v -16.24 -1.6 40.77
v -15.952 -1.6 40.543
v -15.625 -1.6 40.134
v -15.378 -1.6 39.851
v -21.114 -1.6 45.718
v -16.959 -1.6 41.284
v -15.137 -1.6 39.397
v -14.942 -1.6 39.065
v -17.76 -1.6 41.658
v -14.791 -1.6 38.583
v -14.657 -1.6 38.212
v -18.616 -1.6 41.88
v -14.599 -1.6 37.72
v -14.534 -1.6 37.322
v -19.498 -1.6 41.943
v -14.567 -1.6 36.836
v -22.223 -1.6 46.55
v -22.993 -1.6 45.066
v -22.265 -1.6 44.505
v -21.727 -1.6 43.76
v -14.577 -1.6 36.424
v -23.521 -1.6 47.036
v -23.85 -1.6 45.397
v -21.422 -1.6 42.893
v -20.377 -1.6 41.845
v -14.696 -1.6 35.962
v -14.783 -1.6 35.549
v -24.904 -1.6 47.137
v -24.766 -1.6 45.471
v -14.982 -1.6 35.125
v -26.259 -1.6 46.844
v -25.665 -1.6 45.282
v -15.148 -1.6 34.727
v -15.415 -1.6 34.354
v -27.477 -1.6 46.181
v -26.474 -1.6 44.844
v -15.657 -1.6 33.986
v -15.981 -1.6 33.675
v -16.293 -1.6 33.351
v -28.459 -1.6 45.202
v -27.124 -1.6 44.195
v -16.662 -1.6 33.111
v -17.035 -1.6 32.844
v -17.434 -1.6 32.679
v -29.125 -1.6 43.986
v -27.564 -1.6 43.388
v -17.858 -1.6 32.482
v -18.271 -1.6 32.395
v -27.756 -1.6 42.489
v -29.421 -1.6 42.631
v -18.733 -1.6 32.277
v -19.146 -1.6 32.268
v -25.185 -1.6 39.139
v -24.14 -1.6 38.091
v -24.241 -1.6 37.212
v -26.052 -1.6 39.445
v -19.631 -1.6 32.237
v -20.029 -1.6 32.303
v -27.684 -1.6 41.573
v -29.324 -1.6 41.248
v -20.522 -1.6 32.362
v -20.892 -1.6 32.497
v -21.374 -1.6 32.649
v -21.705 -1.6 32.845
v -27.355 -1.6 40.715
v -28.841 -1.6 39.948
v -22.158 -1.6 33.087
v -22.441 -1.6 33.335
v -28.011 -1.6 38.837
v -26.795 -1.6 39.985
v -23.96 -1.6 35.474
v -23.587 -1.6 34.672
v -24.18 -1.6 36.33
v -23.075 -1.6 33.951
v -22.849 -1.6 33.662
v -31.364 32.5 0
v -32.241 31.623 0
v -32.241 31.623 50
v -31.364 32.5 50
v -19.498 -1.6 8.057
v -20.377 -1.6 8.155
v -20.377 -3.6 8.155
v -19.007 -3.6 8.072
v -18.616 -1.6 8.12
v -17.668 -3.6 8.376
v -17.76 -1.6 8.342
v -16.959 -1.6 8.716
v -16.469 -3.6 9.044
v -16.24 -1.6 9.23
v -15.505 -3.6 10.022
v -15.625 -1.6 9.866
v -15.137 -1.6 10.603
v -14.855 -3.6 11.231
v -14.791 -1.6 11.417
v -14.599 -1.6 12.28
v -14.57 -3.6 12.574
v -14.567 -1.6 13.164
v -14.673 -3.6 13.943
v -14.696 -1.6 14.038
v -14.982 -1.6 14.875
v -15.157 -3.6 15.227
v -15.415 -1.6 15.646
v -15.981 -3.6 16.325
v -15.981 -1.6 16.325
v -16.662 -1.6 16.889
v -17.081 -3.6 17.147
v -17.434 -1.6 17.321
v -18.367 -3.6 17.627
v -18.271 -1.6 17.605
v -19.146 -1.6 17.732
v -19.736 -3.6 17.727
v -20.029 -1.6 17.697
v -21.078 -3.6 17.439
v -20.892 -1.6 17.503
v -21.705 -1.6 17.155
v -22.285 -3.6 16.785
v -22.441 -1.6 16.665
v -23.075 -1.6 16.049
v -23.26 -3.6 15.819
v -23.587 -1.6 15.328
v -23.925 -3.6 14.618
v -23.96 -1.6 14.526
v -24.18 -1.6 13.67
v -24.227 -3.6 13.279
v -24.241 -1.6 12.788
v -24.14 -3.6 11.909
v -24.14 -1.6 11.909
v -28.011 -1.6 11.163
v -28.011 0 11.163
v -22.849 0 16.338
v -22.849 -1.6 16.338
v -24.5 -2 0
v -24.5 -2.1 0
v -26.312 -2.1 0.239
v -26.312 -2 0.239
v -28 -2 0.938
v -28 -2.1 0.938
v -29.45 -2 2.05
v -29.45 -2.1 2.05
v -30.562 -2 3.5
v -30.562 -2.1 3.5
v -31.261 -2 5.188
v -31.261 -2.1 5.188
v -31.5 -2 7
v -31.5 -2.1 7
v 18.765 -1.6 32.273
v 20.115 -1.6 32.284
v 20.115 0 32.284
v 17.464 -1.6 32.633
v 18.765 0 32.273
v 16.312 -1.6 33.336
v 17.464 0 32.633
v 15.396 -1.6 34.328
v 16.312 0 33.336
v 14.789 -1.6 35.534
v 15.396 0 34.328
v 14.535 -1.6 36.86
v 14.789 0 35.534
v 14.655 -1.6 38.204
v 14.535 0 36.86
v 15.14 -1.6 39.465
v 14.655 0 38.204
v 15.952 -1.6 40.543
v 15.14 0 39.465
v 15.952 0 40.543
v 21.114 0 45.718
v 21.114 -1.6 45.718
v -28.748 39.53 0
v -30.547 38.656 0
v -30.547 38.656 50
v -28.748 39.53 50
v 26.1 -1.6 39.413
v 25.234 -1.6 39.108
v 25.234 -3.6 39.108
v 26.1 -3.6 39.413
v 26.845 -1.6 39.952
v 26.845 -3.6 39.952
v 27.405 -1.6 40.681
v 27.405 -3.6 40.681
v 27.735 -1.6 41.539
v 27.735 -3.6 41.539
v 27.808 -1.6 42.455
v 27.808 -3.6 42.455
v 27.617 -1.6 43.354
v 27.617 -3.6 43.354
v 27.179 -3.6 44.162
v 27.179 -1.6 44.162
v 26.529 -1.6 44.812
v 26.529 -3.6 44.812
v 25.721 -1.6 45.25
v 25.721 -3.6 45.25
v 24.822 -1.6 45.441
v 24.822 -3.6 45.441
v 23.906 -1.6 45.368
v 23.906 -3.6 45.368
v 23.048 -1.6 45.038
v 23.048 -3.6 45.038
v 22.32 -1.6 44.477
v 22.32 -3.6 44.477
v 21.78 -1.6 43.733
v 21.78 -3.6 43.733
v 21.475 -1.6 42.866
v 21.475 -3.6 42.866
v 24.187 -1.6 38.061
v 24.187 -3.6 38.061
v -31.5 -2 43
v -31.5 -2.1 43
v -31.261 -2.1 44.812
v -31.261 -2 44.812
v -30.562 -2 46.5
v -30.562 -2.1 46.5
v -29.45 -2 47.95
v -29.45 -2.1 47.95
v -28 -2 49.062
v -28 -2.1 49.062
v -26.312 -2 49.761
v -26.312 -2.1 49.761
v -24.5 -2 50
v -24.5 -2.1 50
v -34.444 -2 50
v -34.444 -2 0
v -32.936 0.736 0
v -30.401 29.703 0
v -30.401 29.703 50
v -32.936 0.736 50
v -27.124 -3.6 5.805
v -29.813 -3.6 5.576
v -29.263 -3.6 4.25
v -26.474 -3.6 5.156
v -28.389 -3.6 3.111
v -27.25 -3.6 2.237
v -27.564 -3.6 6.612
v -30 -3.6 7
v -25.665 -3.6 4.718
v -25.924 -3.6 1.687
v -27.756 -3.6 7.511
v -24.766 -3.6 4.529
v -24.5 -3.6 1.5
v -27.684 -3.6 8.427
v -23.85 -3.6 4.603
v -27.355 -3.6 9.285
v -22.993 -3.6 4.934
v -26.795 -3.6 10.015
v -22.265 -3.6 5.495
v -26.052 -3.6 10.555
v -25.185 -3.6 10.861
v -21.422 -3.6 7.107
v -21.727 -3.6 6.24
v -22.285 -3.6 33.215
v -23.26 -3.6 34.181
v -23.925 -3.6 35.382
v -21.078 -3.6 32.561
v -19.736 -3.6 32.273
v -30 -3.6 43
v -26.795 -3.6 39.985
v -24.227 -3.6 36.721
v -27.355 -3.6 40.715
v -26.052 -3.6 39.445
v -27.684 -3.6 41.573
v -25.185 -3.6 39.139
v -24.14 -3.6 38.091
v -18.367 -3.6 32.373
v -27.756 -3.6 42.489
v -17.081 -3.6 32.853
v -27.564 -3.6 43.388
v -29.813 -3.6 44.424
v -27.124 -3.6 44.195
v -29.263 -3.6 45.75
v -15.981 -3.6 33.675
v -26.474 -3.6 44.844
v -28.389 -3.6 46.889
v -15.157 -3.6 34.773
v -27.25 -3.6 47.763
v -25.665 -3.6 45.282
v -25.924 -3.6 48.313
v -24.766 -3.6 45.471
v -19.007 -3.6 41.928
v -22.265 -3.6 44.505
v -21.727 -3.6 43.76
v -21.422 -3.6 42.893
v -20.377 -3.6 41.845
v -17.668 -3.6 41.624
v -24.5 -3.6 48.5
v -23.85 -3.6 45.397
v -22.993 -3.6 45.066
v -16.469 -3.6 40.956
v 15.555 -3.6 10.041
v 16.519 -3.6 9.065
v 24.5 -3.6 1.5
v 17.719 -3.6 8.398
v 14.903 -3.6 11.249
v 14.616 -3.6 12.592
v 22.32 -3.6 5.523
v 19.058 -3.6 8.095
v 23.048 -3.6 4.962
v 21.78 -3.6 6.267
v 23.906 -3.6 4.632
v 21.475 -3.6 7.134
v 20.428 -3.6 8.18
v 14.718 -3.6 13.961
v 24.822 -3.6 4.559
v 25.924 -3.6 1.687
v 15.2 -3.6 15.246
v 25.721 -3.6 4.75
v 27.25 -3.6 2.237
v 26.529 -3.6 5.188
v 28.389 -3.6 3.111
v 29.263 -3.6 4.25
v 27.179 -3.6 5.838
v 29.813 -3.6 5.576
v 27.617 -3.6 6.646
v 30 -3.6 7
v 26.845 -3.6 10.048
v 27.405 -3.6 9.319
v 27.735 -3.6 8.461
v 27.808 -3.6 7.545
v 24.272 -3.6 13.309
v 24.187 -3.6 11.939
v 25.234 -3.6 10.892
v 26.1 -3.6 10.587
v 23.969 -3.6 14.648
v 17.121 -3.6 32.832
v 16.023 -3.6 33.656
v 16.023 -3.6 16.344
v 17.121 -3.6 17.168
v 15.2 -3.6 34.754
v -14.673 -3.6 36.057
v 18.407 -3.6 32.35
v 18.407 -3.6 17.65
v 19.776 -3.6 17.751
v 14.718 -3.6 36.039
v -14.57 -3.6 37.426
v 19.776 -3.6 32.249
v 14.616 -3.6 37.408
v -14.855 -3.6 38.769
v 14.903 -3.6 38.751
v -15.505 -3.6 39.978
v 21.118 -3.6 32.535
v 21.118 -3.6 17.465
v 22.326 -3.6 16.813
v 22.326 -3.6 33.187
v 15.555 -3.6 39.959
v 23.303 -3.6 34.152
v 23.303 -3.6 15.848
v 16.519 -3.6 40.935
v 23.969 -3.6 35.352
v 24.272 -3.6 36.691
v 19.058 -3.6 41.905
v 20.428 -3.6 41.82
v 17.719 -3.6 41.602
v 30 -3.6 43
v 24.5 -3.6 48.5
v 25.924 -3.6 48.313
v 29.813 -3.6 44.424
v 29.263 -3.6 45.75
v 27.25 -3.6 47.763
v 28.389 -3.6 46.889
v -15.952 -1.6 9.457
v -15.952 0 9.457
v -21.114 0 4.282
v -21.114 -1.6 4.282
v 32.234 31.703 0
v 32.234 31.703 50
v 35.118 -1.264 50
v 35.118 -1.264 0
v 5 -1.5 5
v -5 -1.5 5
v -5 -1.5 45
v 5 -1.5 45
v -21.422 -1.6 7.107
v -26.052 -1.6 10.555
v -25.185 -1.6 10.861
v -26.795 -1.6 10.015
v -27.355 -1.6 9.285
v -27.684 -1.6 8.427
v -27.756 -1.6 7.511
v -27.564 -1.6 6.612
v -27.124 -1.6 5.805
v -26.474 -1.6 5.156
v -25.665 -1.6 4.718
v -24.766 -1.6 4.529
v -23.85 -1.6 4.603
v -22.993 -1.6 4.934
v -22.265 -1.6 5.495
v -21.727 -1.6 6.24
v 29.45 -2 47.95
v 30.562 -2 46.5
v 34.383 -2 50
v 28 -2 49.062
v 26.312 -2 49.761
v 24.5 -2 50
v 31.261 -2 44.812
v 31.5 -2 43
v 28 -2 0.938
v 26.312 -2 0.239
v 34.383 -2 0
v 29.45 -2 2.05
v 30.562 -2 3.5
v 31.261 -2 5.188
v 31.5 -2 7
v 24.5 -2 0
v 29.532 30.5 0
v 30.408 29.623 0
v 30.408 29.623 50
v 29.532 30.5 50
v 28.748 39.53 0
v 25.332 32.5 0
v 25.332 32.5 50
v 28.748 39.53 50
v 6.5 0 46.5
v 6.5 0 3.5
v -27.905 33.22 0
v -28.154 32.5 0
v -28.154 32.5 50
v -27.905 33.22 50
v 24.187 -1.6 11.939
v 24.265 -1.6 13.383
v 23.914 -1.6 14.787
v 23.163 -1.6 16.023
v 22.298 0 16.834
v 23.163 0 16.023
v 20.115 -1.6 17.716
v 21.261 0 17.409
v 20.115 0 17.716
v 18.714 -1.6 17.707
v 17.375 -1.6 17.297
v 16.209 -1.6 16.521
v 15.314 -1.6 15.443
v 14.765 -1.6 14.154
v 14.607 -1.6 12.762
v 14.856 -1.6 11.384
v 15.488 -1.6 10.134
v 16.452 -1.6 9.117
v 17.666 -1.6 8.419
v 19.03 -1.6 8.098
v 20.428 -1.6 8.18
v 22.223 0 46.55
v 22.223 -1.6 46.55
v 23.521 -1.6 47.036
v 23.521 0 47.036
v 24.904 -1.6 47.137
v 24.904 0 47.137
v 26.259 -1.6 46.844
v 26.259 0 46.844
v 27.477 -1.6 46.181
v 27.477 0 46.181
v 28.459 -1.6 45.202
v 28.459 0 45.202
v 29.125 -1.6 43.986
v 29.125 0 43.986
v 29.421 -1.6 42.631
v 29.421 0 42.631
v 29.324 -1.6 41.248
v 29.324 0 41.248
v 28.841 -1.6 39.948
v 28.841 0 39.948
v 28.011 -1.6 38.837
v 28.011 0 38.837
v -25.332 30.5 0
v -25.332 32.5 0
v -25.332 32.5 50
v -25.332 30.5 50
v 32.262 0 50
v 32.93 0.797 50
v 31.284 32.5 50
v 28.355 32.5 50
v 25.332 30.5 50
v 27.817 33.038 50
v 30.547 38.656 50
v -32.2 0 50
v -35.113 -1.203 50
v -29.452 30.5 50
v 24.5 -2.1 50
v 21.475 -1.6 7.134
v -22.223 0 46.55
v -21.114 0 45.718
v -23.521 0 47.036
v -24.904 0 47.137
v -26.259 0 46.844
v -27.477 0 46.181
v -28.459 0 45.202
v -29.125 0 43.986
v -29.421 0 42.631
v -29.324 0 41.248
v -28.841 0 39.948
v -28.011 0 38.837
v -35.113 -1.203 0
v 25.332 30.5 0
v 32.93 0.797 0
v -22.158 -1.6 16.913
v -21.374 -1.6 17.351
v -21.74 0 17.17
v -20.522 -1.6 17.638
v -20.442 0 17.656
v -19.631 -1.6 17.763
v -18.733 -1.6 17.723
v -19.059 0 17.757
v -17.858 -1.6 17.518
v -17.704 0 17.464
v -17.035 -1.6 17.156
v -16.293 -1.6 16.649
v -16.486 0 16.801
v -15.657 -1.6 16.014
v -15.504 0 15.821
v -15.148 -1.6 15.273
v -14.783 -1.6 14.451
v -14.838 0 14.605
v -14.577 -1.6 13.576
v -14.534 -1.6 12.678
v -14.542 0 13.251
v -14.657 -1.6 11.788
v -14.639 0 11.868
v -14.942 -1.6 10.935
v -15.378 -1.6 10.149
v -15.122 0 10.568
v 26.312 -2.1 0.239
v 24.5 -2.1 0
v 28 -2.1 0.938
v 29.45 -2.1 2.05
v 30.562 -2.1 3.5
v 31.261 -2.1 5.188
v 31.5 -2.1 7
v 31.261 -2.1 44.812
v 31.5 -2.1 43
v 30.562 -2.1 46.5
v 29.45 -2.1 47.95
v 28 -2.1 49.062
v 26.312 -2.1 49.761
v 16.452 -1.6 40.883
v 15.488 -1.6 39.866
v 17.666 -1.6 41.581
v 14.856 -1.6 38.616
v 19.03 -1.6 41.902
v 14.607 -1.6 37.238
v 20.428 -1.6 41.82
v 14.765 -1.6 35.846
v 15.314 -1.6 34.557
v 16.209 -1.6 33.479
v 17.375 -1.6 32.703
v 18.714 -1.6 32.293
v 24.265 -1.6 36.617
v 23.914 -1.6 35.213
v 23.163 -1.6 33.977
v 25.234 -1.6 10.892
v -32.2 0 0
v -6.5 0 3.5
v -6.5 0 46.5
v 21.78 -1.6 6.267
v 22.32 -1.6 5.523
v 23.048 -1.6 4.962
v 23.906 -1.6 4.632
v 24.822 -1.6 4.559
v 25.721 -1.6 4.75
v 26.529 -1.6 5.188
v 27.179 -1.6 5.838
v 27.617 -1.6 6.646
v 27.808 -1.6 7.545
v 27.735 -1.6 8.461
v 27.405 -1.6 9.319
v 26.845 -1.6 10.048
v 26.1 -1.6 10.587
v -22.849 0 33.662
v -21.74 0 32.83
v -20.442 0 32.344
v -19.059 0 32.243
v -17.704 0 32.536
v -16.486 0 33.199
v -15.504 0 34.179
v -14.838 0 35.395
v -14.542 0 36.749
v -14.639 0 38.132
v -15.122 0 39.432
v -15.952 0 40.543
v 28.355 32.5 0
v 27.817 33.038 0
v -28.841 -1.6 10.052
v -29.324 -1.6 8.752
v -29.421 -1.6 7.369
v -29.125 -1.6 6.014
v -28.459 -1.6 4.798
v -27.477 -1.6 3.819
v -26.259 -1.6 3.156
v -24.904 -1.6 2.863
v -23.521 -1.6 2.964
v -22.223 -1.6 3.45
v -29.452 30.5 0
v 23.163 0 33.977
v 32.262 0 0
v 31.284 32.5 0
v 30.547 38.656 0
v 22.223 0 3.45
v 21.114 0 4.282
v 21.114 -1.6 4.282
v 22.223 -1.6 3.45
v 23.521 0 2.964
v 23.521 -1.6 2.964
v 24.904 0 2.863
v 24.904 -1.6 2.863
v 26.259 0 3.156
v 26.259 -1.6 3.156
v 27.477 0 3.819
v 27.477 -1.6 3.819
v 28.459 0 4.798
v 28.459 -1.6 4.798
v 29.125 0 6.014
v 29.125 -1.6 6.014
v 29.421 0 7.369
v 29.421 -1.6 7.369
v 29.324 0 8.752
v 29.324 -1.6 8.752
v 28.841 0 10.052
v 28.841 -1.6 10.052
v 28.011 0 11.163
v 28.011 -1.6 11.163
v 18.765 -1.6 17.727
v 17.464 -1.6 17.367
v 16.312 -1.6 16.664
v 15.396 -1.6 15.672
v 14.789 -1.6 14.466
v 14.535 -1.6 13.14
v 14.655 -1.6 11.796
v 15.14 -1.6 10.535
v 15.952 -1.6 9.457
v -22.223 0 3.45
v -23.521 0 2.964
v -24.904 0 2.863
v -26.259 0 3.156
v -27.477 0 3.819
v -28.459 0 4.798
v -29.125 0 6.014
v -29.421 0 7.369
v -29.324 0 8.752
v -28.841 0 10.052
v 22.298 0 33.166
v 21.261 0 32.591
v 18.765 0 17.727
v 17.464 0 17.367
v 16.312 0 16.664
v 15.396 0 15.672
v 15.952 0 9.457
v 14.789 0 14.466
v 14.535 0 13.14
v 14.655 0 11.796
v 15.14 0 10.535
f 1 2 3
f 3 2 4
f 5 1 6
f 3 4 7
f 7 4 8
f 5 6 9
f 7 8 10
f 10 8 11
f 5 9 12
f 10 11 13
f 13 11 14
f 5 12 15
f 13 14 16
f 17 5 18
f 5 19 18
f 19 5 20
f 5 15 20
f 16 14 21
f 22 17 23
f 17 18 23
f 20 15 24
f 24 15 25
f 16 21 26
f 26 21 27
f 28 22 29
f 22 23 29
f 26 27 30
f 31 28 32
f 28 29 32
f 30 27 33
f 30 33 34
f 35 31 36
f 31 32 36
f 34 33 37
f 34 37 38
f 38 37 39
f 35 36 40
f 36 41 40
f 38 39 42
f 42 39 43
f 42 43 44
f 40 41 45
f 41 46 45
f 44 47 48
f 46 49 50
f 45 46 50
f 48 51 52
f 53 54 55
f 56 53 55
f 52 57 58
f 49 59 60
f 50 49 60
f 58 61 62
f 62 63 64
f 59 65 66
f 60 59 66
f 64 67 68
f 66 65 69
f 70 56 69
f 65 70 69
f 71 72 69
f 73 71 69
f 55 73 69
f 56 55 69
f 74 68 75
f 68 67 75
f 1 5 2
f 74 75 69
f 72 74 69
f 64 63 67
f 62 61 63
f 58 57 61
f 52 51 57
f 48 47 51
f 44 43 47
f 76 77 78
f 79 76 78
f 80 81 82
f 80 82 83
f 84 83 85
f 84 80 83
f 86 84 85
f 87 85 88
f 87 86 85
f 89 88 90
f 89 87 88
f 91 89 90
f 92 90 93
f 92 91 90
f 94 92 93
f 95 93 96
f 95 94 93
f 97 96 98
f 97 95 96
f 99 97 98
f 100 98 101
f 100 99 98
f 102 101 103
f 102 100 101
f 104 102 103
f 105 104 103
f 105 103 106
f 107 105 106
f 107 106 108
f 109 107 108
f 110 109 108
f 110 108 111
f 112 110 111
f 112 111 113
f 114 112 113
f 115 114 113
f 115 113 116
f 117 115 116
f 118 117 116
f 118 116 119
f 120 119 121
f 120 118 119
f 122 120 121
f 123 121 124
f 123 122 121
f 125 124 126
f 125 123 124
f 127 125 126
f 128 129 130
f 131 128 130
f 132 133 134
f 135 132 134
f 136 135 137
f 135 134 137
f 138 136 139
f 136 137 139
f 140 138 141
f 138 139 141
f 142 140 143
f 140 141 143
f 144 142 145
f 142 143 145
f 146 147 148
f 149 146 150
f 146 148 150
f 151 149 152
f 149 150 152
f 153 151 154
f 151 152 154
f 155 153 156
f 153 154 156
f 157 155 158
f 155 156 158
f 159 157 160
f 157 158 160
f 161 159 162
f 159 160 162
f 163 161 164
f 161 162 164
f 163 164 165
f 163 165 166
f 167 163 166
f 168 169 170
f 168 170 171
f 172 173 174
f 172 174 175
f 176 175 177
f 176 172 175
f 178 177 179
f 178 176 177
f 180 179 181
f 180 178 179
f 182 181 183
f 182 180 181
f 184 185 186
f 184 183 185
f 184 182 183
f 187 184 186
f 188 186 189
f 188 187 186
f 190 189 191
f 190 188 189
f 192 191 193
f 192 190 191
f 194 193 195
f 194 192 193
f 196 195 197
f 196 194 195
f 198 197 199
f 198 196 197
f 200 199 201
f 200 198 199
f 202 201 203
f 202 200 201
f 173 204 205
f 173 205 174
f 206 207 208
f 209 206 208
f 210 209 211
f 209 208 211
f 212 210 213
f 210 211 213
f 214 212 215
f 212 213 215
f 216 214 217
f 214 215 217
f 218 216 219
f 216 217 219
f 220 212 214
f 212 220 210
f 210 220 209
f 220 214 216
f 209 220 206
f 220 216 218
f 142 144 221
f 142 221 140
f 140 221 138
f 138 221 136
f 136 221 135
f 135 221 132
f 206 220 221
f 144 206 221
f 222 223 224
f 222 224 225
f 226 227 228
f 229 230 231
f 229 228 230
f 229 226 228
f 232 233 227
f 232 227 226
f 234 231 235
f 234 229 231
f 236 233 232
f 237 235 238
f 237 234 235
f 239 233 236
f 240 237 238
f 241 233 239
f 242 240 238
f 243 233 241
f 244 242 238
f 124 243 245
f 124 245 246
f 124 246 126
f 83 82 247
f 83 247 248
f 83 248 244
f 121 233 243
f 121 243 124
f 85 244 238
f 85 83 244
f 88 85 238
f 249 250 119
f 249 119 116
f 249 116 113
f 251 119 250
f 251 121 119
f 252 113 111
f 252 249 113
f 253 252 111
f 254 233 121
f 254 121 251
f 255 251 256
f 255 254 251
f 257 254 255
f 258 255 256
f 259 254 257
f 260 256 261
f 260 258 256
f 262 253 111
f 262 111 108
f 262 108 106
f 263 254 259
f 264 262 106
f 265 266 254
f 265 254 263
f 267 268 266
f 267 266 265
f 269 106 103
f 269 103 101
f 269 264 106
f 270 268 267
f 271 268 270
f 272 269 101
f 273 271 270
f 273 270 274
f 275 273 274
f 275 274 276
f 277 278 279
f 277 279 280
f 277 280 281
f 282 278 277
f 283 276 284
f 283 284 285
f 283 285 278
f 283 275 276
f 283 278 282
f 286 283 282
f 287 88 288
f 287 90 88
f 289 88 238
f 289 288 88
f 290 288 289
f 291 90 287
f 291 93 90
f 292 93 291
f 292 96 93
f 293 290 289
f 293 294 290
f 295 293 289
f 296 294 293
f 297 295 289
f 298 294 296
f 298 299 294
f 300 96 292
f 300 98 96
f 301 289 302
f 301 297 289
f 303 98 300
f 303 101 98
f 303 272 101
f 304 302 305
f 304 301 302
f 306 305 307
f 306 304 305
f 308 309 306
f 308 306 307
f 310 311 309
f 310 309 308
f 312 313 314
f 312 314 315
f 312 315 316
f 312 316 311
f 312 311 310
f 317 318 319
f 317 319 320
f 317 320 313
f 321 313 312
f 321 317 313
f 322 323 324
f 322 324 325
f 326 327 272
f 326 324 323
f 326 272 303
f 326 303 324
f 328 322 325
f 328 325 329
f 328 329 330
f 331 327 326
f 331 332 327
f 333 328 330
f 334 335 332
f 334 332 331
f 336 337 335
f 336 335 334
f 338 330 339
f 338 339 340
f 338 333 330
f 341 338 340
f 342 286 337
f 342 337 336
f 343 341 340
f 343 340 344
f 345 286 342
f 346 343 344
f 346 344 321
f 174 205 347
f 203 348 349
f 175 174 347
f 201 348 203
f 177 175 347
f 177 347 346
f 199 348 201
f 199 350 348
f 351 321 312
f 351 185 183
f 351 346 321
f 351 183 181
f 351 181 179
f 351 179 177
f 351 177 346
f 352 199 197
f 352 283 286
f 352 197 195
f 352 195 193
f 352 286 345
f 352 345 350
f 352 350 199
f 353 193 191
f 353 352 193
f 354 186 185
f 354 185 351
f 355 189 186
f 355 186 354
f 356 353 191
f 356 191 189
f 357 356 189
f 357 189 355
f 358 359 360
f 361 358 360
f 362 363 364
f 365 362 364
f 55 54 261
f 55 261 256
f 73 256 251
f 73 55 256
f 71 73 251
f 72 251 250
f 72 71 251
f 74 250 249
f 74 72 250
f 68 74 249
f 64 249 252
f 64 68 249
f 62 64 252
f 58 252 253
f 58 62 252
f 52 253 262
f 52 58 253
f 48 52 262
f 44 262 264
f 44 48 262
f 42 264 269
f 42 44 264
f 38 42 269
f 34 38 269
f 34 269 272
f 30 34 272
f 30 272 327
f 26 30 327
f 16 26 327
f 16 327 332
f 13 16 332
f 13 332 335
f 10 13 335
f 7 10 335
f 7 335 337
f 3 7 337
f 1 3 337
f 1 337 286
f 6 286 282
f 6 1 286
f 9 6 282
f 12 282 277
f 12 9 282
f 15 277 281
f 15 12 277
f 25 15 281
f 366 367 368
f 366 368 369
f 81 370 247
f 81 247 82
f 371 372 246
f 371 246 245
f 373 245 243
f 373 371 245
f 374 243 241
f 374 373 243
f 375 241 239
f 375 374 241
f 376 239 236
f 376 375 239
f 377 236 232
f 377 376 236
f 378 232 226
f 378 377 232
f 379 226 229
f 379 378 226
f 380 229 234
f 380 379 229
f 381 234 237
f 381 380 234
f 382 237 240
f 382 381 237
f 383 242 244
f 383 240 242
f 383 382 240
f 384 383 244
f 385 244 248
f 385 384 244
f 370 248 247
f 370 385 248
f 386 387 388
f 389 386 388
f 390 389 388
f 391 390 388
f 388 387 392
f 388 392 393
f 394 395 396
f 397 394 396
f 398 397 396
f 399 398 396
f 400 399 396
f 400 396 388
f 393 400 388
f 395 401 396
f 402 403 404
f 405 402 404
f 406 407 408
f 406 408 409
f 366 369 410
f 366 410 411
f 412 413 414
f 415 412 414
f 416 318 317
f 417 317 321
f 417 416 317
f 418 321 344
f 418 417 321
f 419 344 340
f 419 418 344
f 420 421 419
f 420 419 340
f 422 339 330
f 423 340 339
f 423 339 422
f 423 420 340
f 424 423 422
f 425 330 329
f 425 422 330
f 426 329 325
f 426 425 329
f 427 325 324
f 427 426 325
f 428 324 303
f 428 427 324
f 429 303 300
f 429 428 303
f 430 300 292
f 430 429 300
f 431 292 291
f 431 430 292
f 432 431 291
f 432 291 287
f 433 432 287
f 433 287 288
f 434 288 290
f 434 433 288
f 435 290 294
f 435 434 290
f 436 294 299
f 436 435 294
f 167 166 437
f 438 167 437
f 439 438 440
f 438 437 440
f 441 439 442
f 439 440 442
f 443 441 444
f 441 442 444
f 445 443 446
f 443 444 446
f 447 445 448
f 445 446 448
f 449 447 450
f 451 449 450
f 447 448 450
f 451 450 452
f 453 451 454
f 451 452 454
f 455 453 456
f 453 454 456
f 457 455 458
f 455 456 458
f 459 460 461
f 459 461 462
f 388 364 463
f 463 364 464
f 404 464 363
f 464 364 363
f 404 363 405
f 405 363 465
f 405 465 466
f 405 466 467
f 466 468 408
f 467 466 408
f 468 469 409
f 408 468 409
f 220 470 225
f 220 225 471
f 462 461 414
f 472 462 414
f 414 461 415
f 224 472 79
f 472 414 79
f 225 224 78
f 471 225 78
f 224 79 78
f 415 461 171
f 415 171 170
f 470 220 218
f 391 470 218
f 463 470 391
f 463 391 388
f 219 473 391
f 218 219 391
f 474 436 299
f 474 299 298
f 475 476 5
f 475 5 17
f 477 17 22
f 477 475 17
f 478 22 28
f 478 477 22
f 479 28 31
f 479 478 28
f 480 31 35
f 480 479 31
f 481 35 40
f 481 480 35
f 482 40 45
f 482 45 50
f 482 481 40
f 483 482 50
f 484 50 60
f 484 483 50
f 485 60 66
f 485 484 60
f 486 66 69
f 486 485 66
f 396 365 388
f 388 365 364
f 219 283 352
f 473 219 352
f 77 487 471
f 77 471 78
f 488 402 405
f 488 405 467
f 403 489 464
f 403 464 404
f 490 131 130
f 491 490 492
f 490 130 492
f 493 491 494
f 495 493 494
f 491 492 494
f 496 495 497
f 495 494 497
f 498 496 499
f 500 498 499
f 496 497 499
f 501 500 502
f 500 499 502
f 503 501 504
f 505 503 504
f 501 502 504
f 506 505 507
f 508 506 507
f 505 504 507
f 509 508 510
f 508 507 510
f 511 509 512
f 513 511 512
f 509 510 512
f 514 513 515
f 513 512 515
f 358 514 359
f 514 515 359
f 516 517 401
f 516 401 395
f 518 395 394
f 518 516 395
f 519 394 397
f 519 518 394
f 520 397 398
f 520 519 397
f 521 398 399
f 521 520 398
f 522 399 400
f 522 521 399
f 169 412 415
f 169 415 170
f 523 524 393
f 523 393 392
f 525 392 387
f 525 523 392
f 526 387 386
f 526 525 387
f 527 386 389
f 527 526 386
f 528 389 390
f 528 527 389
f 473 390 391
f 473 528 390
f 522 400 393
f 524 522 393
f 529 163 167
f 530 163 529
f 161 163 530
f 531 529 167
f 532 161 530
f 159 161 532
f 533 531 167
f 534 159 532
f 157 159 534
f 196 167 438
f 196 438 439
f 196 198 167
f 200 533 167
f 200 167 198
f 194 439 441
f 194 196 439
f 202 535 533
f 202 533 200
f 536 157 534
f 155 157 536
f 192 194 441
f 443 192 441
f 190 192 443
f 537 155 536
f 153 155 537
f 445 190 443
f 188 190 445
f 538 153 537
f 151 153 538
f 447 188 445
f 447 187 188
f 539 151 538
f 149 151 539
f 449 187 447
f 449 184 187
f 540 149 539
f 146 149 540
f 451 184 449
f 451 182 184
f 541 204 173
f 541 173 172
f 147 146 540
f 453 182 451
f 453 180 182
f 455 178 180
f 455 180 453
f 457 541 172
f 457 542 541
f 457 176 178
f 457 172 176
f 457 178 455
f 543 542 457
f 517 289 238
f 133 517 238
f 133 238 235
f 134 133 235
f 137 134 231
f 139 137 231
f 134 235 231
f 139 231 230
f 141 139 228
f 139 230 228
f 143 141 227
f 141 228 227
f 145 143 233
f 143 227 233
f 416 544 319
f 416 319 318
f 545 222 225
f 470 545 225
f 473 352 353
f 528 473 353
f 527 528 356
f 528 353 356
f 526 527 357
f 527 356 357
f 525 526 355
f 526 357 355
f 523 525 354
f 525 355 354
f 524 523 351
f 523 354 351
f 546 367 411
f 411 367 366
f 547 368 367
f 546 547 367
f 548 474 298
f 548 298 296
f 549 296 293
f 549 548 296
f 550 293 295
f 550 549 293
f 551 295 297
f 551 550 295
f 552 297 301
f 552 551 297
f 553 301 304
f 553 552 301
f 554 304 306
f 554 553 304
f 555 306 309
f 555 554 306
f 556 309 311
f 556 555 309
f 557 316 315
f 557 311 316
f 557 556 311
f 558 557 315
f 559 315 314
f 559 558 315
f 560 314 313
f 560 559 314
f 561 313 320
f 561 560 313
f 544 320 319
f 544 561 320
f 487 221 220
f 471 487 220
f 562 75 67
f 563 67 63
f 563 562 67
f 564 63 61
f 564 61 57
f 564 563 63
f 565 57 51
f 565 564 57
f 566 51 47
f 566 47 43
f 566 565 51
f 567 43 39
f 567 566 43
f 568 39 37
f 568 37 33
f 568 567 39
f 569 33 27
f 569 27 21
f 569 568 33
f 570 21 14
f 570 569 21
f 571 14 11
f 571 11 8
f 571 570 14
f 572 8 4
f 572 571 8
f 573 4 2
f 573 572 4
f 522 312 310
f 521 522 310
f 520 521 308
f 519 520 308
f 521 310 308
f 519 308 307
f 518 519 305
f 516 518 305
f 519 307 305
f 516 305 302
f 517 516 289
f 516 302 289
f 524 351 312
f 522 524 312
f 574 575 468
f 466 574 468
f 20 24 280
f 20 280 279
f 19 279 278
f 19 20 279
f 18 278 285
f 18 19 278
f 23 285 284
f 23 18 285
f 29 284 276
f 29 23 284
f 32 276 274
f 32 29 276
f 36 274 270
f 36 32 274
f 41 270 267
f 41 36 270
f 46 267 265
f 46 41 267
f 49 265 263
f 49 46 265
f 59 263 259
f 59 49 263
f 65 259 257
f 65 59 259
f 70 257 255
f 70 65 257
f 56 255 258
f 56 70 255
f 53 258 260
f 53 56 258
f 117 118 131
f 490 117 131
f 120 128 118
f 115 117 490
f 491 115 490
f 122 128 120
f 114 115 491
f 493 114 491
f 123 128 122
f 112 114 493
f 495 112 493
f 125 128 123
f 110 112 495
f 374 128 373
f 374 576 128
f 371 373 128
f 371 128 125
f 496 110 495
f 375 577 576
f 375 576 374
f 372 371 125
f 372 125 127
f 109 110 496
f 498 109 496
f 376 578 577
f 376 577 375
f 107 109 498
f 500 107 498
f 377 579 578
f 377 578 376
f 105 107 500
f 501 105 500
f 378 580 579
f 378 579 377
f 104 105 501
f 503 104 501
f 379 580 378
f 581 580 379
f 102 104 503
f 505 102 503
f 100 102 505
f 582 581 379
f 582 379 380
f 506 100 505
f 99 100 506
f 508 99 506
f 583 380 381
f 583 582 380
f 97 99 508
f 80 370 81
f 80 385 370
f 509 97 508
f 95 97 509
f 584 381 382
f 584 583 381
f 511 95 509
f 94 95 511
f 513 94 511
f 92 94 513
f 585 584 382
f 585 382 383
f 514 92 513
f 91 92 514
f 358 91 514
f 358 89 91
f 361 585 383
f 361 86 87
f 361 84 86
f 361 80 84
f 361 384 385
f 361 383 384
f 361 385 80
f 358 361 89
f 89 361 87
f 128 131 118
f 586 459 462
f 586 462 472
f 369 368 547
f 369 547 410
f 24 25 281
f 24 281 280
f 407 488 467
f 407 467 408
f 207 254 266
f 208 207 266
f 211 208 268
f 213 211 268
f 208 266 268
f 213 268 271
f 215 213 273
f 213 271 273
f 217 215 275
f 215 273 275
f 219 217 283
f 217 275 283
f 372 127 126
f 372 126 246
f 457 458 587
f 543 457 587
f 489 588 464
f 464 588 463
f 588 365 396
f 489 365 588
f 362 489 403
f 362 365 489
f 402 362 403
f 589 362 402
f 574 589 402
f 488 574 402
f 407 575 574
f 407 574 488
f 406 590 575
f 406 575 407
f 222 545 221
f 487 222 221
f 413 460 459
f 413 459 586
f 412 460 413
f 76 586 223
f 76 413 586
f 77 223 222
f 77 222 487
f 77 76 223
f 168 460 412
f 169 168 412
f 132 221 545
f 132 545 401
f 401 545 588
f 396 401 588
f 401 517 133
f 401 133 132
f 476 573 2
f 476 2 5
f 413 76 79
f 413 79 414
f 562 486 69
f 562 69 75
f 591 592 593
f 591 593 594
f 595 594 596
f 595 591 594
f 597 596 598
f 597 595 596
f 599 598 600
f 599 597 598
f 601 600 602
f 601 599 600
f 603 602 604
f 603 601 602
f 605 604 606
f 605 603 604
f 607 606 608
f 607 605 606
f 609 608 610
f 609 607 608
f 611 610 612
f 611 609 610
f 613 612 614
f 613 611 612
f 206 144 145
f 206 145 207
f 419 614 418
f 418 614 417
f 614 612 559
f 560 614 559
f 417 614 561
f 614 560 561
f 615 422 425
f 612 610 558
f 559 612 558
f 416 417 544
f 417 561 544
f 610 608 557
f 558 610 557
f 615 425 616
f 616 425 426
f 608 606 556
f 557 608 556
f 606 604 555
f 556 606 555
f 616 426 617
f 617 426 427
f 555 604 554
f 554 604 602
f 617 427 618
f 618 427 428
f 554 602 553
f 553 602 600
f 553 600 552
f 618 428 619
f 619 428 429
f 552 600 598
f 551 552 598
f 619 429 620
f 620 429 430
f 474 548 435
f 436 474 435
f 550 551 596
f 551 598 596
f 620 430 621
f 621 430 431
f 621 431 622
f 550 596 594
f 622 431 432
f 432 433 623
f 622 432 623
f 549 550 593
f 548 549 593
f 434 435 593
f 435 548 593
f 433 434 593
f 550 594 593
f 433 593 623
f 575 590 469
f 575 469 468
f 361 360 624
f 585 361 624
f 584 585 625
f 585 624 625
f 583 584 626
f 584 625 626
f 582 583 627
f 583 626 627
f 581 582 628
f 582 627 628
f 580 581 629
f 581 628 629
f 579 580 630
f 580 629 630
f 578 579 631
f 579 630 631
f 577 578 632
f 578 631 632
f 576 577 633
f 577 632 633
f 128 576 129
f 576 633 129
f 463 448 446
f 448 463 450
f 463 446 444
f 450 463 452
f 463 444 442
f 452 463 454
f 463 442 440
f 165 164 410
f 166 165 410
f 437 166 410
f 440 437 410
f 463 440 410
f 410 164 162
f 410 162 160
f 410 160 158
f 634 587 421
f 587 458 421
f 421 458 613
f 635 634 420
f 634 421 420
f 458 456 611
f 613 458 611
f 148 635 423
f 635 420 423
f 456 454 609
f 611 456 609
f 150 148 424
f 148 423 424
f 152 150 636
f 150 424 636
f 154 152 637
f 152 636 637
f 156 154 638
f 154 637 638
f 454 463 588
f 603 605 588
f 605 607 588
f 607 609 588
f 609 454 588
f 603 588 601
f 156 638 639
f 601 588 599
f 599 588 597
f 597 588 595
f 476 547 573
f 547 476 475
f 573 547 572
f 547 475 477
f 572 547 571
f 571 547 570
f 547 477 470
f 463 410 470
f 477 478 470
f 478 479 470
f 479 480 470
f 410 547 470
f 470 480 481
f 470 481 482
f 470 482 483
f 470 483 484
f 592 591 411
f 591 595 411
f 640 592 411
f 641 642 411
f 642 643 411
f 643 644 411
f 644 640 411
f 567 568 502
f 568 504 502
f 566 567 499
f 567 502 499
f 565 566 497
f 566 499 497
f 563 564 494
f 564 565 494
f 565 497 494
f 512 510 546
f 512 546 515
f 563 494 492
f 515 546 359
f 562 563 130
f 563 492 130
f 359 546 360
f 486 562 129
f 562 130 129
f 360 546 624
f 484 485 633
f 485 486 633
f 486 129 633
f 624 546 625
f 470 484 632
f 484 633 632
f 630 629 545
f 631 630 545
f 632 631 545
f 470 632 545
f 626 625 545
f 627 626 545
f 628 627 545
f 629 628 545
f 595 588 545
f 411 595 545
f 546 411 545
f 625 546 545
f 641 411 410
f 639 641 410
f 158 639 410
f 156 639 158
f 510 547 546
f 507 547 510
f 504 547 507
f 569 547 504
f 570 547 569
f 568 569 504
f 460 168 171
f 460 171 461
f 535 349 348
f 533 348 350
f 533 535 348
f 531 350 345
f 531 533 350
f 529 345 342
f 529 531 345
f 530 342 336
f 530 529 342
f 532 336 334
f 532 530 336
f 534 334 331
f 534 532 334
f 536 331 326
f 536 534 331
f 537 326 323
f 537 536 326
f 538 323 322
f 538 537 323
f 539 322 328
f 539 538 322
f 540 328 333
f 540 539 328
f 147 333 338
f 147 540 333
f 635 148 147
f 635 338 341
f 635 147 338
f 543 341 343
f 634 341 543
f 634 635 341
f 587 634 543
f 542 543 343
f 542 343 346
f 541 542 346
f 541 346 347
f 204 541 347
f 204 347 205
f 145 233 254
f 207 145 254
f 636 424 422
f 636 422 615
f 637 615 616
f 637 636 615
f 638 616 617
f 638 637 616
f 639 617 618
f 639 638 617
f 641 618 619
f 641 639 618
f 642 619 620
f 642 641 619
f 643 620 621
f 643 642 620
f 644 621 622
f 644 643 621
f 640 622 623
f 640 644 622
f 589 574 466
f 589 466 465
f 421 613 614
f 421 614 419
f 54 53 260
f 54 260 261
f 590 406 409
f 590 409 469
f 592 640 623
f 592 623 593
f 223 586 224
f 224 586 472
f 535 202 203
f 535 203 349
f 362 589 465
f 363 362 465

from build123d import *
from OCP.BRepFilletAPI import BRepFilletAPI_MakeChamfer

# Parameters (mm, degrees)
BOSS_EXTRUDE1_DEPTH = 50
SKETCH5_W           = 63
SKETCH5_H           = 50
BOSS_EXTRUDE2_DEPTH = 1.6
SKETCH9_W           = 10
SKETCH9_H           = 40
CUT_EXTRUDE4_DEPTH  = 1.5
CHAMFER4_SIZE       = 1.5
CHAMFER6_SIZE       = 0.8
CHAMFER6_SIZE2      = 0.738449877
CHAMFER7_SIZE       = 0.8
CHAMFER7_SIZE2      = 0.880050294
CHAMFER7_SIZE2_2    = 0.59857957
FILLET1_R           = 7
CHAMFER10_SIZE      = 1.5
CUT_EXTRUDE5_REACH  = 74.773
CUT_EXTRUDE6_DEPTH  = 1.6


with BuildPart() as part:
    # Sketch1 → Boss-Extrude1 (new body)
    with BuildSketch(Plane.XY):
        Polygon((-32.16425811, 32.5), (-27.555232111, 32.5), (-30.546782223, 38.65618727), (-28.747926936, 39.530326652), (-25.331595762, 32.5), (-25.331595762, 30.5), (-30.331595762, 30.5), (-33, 0), (0, 0), (33, 0), (30.331595762, 30.5), (25.331595762, 30.5), (25.331595762, 32.5), (28.747926936, 39.530326652), (30.546782223, 38.65618727), (27.555232111, 32.5), (32.16425811, 32.5), (35.182617002, -2), (0, -2), (-35.182617002, -2), align=None)
    extrude(amount=BOSS_EXTRUDE1_DEPTH)

    # Sketch5 → Boss-Extrude2 (add)
    with BuildSketch(Plane.XZ.offset(2)):
        with Locations((0, 25)):
            Rectangle(SKETCH5_W, SKETCH5_H)
    extrude(amount=BOSS_EXTRUDE2_DEPTH)

    # Sketch9 → Cut-Extrude4 (cut)
    with BuildSketch(Plane(origin=(0, 0, 0), x_dir=(1, 0, 0), z_dir=(0, 1, 0))):
        with Locations((0, -25)):
            Rectangle(SKETCH9_W, SKETCH9_H)
    extrude(amount=-CUT_EXTRUDE4_DEPTH, mode=Mode.SUBTRACT)

    # Chamfer4
    chamfer4_edges = [part.edges().sort_by_distance(p)[0] for p in [
        (0, 0, 45),
        (-5, 0, 25),
        (0, 0, 5),
        (5, 0, 25),
    ]]
    chamfer(chamfer4_edges, length=CHAMFER4_SIZE - 0.0001)  # a hair under: the kernel refuses the full size

    # Chamfer6: one chamfer whose edges measure the first distance from different faces: ONE call of the kernel's chamfer builder (chamfer() names one face for all edges)
    chamfer6_edges_1 = [part.edges().sort_by_distance(p)[0] for p in [
        (-33, 0, 25),
    ]]
    chamfer6_side_1 = [part.faces().sort_by_distance(p)[0] for p in [
        (0, 0, 47.327909662),
    ]]
    chamfer6_edges_2 = [part.edges().sort_by_distance(p)[0] for p in [
        (33, 0, 25),
    ]]
    chamfer6_side_2 = [part.faces().sort_by_distance(p)[0] for p in [
        (31.665797881, 15.25, 25),
    ]]
    chamfer6_edges_3 = [part.edges().sort_by_distance(p)[0] for p in [
        (35.182617002, -2, 25),
    ]]
    chamfer6_side_3 = [part.faces().sort_by_distance(p)[0] for p in [
        (33.341308501, -2, 25),
    ]]
    chamfer6_edges_4 = [part.edges().sort_by_distance(p)[0] for p in [
        (-35.182617002, -2, 25),
    ]]
    chamfer6_side_4 = [part.faces().sort_by_distance(p)[0] for p in [
        (-33.673437556, 15.25, 25),
    ]]
    chamfer6 = BRepFilletAPI_MakeChamfer(part.part.solid().wrapped)
    for e in chamfer6_edges_1:
        chamfer6.Add(CHAMFER6_SIZE, CHAMFER6_SIZE2, e.wrapped, chamfer6_side_1[0].wrapped)  # the first distance lies on this face
    for e in chamfer6_edges_2:
        chamfer6.Add(CHAMFER6_SIZE, CHAMFER6_SIZE2, e.wrapped, chamfer6_side_2[0].wrapped)  # the first distance lies on this face
    for e in chamfer6_edges_3:
        chamfer6.Add(CHAMFER6_SIZE, CHAMFER6_SIZE2, e.wrapped, chamfer6_side_3[0].wrapped)  # the first distance lies on this face
    for e in chamfer6_edges_4:
        chamfer6.Add(CHAMFER6_SIZE, CHAMFER6_SIZE2, e.wrapped, chamfer6_side_4[0].wrapped)  # the first distance lies on this face
    add(Compound.cast(chamfer6.Shape()), mode=Mode.REPLACE)

    # Chamfer7: one chamfer whose edges measure the first distance from different faces: ONE call of the kernel's chamfer builder (chamfer() names one face for all edges)
    chamfer7_edges_1 = [part.edges().sort_by_distance(p)[0] for p in [
        (-30.331595762, 30.5, 25),
    ]]
    chamfer7_side_1 = [part.faces().sort_by_distance(p)[0] for p in [
        (-31.633617807, 15.617819926, 25),
    ]]
    chamfer7_edges_2 = [part.edges().sort_by_distance(p)[0] for p in [
        (30.331595762, 30.5, 25),
    ]]
    chamfer7_side_2 = [part.faces().sort_by_distance(p)[0] for p in [
        (27.831595762, 30.5, 25),
    ]]
    chamfer7_edges_3 = [part.edges().sort_by_distance(p)[0] for p in [
        (27.555232111, 32.5, 25),
    ]]
    chamfer7_side_3 = [part.faces().sort_by_distance(p)[0] for p in [
        (29.859745111, 32.5, 25),
    ]]
    chamfer7_edges_4 = [part.edges().sort_by_distance(p)[0] for p in [
        (32.16425811, 32.5, 25),
    ]]
    chamfer7_side_4 = [part.faces().sort_by_distance(p)[0] for p in [
        (33.641257483, 15.617819926, 25),
    ]]
    chamfer7_edges_5 = [part.edges().sort_by_distance(p)[0] for p in [
        (-32.16425811, 32.5, 25),
    ]]
    chamfer7_side_5 = [part.faces().sort_by_distance(p)[0] for p in [
        (-29.859745111, 32.5, 25),
    ]]
    chamfer7_edges_6 = [part.edges().sort_by_distance(p)[0] for p in [
        (-27.555232111, 32.5, 25),
    ]]
    chamfer7_side_6 = [part.faces().sort_by_distance(p)[0] for p in [
        (-29.051007167, 35.578093635, 25),
    ]]
    chamfer7 = BRepFilletAPI_MakeChamfer(part.part.solid().wrapped)
    for e in chamfer7_edges_1:
        chamfer7.Add(CHAMFER7_SIZE, CHAMFER7_SIZE2, e.wrapped, chamfer7_side_1[0].wrapped)  # the first distance lies on this face
    for e in chamfer7_edges_2:
        chamfer7.Add(CHAMFER7_SIZE, CHAMFER7_SIZE2, e.wrapped, chamfer7_side_2[0].wrapped)  # the first distance lies on this face
    for e in chamfer7_edges_3:
        chamfer7.Add(CHAMFER7_SIZE, CHAMFER7_SIZE2_2, e.wrapped, chamfer7_side_3[0].wrapped)  # the first distance lies on this face
    for e in chamfer7_edges_4:
        chamfer7.Add(CHAMFER7_SIZE, CHAMFER7_SIZE2, e.wrapped, chamfer7_side_4[0].wrapped)  # the first distance lies on this face
    for e in chamfer7_edges_5:
        chamfer7.Add(CHAMFER7_SIZE, CHAMFER7_SIZE2, e.wrapped, chamfer7_side_5[0].wrapped)  # the first distance lies on this face
    for e in chamfer7_edges_6:
        chamfer7.Add(CHAMFER7_SIZE, CHAMFER7_SIZE2_2, e.wrapped, chamfer7_side_6[0].wrapped)  # the first distance lies on this face
    add(Compound.cast(chamfer7.Shape()), mode=Mode.REPLACE)

    # Fillet1
    fillet1_edges = [part.edges().sort_by_distance(p)[0] for p in [
        (-31.5, -2.8, 0),
        (31.5, -2.8, 0),
        (31.5, -2.8, 50),
        (-31.5, -2.8, 50),
    ]]
    fillet(fillet1_edges, radius=FILLET1_R)

    # Chamfer10
    chamfer10_edges = [part.edges().sort_by_distance(p)[0] for p in [
        (-31.5, -3.6, 25),
        (0, -3.6, 50),
        (0, -3.6, 0),
        (31.5, -3.6, 25),
        (29.449747468, -3.6, 47.949747468),
        (29.449747468, -3.6, 2.050252532),
        (-29.449747468, -3.6, 2.050252532),
        (-29.449747468, -3.6, 47.949747468),
    ]]
    chamfer(chamfer10_edges, length=CHAMFER10_SIZE)

    # Sketch15 → Cut-Extrude5 (cut, up to next)
    with BuildSketch(Plane(origin=(0, 0, 0), x_dir=(1, 0, 0), z_dir=(0, 1, 0)), mode=Mode.PRIVATE) as cut_extrude5_sk1:
        with BuildLine():
            Line((21.475016583, -42.866268583), (20.428249938, -41.819501939))
            ThreePointArc((20.428249938, -41.819501939), (16.022847213, -33.655561292), (24.186787861, -38.060964016))
            Line((24.186787861, -38.060964016), (25.233554505, -39.107730661))
            ThreePointArc((25.233554505, -39.107730661), (26.877324102, -44.51003818), (21.475016583, -42.866268583))
        make_face()
    cut_extrude5_tool1 = extrude(cut_extrude5_sk1.sketch, amount=-CUT_EXTRUDE5_REACH, mode=Mode.PRIVATE) & part.part
    # Sketch15 → Cut-Extrude5 (cut, up to next)
    with BuildSketch(Plane(origin=(0, 0, 0), x_dir=(1, 0, 0), z_dir=(0, 1, 0)), mode=Mode.PRIVATE) as cut_extrude5_sk2:
        with BuildLine():
            Line((-25.185393692, -39.138763585), (-24.139916413, -38.090709162))
            ThreePointArc((-24.139916413, -38.090709162), (-15.98140501, -33.675259948), (-20.37675457, -41.844617469))
            Line((-20.37675457, -41.844617469), (-21.422231849, -42.892671893))
            ThreePointArc((-21.422231849, -42.892671893), (-26.822511792, -44.543090495), (-25.185393692, -39.138763585))
        make_face()
    cut_extrude5_tool2 = extrude(cut_extrude5_sk2.sketch, amount=-CUT_EXTRUDE5_REACH, mode=Mode.PRIVATE) & part.part
    # Sketch15 → Cut-Extrude5 (cut, up to next)
    with BuildSketch(Plane(origin=(0, 0, 0), x_dir=(1, 0, 0), z_dir=(0, 1, 0)), mode=Mode.PRIVATE) as cut_extrude5_sk3:
        with BuildLine():
            Line((25.233554505, -10.892269339), (24.186787861, -11.939035984))
            ThreePointArc((24.186787861, -11.939035984), (16.022847213, -16.344438708), (20.428249938, -8.180498061))
            Line((20.428249938, -8.180498061), (21.475016583, -7.133731417))
            ThreePointArc((21.475016583, -7.133731417), (26.877324102, -5.48996182), (25.233554505, -10.892269339))
        make_face()
    cut_extrude5_tool3 = extrude(cut_extrude5_sk3.sketch, amount=-CUT_EXTRUDE5_REACH, mode=Mode.PRIVATE) & part.part
    # Sketch15 → Cut-Extrude5 (cut, up to next)
    with BuildSketch(Plane(origin=(0, 0, 0), x_dir=(1, 0, 0), z_dir=(0, 1, 0)), mode=Mode.PRIVATE) as cut_extrude5_sk4:
        with BuildLine():
            Line((-21.422231849, -7.107328107), (-20.37675457, -8.155382531))
            ThreePointArc((-20.37675457, -8.155382531), (-15.98140501, -16.324740052), (-24.139916413, -11.909290838))
            Line((-24.139916413, -11.909290838), (-25.185393692, -10.861236415))
            ThreePointArc((-25.185393692, -10.861236415), (-26.822511792, -5.456909505), (-21.422231849, -7.107328107))
        make_face()
    cut_extrude5_tool4 = extrude(cut_extrude5_sk4.sketch, amount=-CUT_EXTRUDE5_REACH, mode=Mode.PRIVATE) & part.part
    add(cut_extrude5_tool1.solids().sort_by_distance((21.014912, 0, 38.647626))[0], mode=Mode.SUBTRACT)
    add(cut_extrude5_tool2.solids().sort_by_distance((-20.96732, 0, 38.673466))[0], mode=Mode.SUBTRACT)
    add(cut_extrude5_tool3.solids().sort_by_distance((21.014912, 0, 11.352374))[0], mode=Mode.SUBTRACT)
    add(cut_extrude5_tool4.solids().sort_by_distance((-20.96732, 0, 11.326534))[0], mode=Mode.SUBTRACT)

    # Sketch16 → Cut-Extrude6 (cut)
    with BuildSketch(Plane(origin=(0, 0, 0), x_dir=(1, 0, 0), z_dir=(0, 1, 0))):
        with BuildLine():
            Line((-15.951616609, -40.543181032), (-21.113676241, -45.71796535))
            ThreePointArc((-21.113676241, -45.71796535), (-28.002957525, -45.726446075), (-28.011438251, -38.837164791))
            Line((-28.011438251, -38.837164791), (-22.849378618, -33.662380473))
            ThreePointArc((-22.849378618, -33.662380473), (-15.960097334, -33.653899748), (-15.951616609, -40.543181032))
        make_face()
        with BuildLine():
            Line((-15.951616609, -9.456818968), (-21.113676241, -4.28203465))
            ThreePointArc((-21.113676241, -4.28203465), (-28.002957525, -4.273553925), (-28.011438251, -11.162835209))
            Line((-28.011438251, -11.162835209), (-22.849378618, -16.337619527))
            ThreePointArc((-22.849378618, -16.337619527), (-15.960097334, -16.346100252), (-15.951616609, -9.456818968))
        make_face()
        with BuildLine():
            Line((15.951616609, -40.543181032), (21.113676241, -45.71796535))
            ThreePointArc((21.113676241, -45.71796535), (28.002957525, -45.726446075), (28.011438251, -38.837164791))
            Line((28.011438251, -38.837164791), (22.849378618, -33.662380473))
            ThreePointArc((22.849378618, -33.662380473), (15.960097334, -33.653899748), (15.951616609, -40.543181032))
        make_face()
        with BuildLine():
            Line((15.951616609, -9.456818968), (21.113676241, -4.28203465))
            ThreePointArc((21.113676241, -4.28203465), (28.002957525, -4.273553925), (28.011438251, -11.162835209))
            Line((28.011438251, -11.162835209), (22.849378618, -16.337619527))
            ThreePointArc((22.849378618, -16.337619527), (15.960097334, -16.346100252), (15.951616609, -9.456818968))
        make_face()
    extrude(amount=-CUT_EXTRUDE6_DEPTH, mode=Mode.SUBTRACT)


solid = part.part
